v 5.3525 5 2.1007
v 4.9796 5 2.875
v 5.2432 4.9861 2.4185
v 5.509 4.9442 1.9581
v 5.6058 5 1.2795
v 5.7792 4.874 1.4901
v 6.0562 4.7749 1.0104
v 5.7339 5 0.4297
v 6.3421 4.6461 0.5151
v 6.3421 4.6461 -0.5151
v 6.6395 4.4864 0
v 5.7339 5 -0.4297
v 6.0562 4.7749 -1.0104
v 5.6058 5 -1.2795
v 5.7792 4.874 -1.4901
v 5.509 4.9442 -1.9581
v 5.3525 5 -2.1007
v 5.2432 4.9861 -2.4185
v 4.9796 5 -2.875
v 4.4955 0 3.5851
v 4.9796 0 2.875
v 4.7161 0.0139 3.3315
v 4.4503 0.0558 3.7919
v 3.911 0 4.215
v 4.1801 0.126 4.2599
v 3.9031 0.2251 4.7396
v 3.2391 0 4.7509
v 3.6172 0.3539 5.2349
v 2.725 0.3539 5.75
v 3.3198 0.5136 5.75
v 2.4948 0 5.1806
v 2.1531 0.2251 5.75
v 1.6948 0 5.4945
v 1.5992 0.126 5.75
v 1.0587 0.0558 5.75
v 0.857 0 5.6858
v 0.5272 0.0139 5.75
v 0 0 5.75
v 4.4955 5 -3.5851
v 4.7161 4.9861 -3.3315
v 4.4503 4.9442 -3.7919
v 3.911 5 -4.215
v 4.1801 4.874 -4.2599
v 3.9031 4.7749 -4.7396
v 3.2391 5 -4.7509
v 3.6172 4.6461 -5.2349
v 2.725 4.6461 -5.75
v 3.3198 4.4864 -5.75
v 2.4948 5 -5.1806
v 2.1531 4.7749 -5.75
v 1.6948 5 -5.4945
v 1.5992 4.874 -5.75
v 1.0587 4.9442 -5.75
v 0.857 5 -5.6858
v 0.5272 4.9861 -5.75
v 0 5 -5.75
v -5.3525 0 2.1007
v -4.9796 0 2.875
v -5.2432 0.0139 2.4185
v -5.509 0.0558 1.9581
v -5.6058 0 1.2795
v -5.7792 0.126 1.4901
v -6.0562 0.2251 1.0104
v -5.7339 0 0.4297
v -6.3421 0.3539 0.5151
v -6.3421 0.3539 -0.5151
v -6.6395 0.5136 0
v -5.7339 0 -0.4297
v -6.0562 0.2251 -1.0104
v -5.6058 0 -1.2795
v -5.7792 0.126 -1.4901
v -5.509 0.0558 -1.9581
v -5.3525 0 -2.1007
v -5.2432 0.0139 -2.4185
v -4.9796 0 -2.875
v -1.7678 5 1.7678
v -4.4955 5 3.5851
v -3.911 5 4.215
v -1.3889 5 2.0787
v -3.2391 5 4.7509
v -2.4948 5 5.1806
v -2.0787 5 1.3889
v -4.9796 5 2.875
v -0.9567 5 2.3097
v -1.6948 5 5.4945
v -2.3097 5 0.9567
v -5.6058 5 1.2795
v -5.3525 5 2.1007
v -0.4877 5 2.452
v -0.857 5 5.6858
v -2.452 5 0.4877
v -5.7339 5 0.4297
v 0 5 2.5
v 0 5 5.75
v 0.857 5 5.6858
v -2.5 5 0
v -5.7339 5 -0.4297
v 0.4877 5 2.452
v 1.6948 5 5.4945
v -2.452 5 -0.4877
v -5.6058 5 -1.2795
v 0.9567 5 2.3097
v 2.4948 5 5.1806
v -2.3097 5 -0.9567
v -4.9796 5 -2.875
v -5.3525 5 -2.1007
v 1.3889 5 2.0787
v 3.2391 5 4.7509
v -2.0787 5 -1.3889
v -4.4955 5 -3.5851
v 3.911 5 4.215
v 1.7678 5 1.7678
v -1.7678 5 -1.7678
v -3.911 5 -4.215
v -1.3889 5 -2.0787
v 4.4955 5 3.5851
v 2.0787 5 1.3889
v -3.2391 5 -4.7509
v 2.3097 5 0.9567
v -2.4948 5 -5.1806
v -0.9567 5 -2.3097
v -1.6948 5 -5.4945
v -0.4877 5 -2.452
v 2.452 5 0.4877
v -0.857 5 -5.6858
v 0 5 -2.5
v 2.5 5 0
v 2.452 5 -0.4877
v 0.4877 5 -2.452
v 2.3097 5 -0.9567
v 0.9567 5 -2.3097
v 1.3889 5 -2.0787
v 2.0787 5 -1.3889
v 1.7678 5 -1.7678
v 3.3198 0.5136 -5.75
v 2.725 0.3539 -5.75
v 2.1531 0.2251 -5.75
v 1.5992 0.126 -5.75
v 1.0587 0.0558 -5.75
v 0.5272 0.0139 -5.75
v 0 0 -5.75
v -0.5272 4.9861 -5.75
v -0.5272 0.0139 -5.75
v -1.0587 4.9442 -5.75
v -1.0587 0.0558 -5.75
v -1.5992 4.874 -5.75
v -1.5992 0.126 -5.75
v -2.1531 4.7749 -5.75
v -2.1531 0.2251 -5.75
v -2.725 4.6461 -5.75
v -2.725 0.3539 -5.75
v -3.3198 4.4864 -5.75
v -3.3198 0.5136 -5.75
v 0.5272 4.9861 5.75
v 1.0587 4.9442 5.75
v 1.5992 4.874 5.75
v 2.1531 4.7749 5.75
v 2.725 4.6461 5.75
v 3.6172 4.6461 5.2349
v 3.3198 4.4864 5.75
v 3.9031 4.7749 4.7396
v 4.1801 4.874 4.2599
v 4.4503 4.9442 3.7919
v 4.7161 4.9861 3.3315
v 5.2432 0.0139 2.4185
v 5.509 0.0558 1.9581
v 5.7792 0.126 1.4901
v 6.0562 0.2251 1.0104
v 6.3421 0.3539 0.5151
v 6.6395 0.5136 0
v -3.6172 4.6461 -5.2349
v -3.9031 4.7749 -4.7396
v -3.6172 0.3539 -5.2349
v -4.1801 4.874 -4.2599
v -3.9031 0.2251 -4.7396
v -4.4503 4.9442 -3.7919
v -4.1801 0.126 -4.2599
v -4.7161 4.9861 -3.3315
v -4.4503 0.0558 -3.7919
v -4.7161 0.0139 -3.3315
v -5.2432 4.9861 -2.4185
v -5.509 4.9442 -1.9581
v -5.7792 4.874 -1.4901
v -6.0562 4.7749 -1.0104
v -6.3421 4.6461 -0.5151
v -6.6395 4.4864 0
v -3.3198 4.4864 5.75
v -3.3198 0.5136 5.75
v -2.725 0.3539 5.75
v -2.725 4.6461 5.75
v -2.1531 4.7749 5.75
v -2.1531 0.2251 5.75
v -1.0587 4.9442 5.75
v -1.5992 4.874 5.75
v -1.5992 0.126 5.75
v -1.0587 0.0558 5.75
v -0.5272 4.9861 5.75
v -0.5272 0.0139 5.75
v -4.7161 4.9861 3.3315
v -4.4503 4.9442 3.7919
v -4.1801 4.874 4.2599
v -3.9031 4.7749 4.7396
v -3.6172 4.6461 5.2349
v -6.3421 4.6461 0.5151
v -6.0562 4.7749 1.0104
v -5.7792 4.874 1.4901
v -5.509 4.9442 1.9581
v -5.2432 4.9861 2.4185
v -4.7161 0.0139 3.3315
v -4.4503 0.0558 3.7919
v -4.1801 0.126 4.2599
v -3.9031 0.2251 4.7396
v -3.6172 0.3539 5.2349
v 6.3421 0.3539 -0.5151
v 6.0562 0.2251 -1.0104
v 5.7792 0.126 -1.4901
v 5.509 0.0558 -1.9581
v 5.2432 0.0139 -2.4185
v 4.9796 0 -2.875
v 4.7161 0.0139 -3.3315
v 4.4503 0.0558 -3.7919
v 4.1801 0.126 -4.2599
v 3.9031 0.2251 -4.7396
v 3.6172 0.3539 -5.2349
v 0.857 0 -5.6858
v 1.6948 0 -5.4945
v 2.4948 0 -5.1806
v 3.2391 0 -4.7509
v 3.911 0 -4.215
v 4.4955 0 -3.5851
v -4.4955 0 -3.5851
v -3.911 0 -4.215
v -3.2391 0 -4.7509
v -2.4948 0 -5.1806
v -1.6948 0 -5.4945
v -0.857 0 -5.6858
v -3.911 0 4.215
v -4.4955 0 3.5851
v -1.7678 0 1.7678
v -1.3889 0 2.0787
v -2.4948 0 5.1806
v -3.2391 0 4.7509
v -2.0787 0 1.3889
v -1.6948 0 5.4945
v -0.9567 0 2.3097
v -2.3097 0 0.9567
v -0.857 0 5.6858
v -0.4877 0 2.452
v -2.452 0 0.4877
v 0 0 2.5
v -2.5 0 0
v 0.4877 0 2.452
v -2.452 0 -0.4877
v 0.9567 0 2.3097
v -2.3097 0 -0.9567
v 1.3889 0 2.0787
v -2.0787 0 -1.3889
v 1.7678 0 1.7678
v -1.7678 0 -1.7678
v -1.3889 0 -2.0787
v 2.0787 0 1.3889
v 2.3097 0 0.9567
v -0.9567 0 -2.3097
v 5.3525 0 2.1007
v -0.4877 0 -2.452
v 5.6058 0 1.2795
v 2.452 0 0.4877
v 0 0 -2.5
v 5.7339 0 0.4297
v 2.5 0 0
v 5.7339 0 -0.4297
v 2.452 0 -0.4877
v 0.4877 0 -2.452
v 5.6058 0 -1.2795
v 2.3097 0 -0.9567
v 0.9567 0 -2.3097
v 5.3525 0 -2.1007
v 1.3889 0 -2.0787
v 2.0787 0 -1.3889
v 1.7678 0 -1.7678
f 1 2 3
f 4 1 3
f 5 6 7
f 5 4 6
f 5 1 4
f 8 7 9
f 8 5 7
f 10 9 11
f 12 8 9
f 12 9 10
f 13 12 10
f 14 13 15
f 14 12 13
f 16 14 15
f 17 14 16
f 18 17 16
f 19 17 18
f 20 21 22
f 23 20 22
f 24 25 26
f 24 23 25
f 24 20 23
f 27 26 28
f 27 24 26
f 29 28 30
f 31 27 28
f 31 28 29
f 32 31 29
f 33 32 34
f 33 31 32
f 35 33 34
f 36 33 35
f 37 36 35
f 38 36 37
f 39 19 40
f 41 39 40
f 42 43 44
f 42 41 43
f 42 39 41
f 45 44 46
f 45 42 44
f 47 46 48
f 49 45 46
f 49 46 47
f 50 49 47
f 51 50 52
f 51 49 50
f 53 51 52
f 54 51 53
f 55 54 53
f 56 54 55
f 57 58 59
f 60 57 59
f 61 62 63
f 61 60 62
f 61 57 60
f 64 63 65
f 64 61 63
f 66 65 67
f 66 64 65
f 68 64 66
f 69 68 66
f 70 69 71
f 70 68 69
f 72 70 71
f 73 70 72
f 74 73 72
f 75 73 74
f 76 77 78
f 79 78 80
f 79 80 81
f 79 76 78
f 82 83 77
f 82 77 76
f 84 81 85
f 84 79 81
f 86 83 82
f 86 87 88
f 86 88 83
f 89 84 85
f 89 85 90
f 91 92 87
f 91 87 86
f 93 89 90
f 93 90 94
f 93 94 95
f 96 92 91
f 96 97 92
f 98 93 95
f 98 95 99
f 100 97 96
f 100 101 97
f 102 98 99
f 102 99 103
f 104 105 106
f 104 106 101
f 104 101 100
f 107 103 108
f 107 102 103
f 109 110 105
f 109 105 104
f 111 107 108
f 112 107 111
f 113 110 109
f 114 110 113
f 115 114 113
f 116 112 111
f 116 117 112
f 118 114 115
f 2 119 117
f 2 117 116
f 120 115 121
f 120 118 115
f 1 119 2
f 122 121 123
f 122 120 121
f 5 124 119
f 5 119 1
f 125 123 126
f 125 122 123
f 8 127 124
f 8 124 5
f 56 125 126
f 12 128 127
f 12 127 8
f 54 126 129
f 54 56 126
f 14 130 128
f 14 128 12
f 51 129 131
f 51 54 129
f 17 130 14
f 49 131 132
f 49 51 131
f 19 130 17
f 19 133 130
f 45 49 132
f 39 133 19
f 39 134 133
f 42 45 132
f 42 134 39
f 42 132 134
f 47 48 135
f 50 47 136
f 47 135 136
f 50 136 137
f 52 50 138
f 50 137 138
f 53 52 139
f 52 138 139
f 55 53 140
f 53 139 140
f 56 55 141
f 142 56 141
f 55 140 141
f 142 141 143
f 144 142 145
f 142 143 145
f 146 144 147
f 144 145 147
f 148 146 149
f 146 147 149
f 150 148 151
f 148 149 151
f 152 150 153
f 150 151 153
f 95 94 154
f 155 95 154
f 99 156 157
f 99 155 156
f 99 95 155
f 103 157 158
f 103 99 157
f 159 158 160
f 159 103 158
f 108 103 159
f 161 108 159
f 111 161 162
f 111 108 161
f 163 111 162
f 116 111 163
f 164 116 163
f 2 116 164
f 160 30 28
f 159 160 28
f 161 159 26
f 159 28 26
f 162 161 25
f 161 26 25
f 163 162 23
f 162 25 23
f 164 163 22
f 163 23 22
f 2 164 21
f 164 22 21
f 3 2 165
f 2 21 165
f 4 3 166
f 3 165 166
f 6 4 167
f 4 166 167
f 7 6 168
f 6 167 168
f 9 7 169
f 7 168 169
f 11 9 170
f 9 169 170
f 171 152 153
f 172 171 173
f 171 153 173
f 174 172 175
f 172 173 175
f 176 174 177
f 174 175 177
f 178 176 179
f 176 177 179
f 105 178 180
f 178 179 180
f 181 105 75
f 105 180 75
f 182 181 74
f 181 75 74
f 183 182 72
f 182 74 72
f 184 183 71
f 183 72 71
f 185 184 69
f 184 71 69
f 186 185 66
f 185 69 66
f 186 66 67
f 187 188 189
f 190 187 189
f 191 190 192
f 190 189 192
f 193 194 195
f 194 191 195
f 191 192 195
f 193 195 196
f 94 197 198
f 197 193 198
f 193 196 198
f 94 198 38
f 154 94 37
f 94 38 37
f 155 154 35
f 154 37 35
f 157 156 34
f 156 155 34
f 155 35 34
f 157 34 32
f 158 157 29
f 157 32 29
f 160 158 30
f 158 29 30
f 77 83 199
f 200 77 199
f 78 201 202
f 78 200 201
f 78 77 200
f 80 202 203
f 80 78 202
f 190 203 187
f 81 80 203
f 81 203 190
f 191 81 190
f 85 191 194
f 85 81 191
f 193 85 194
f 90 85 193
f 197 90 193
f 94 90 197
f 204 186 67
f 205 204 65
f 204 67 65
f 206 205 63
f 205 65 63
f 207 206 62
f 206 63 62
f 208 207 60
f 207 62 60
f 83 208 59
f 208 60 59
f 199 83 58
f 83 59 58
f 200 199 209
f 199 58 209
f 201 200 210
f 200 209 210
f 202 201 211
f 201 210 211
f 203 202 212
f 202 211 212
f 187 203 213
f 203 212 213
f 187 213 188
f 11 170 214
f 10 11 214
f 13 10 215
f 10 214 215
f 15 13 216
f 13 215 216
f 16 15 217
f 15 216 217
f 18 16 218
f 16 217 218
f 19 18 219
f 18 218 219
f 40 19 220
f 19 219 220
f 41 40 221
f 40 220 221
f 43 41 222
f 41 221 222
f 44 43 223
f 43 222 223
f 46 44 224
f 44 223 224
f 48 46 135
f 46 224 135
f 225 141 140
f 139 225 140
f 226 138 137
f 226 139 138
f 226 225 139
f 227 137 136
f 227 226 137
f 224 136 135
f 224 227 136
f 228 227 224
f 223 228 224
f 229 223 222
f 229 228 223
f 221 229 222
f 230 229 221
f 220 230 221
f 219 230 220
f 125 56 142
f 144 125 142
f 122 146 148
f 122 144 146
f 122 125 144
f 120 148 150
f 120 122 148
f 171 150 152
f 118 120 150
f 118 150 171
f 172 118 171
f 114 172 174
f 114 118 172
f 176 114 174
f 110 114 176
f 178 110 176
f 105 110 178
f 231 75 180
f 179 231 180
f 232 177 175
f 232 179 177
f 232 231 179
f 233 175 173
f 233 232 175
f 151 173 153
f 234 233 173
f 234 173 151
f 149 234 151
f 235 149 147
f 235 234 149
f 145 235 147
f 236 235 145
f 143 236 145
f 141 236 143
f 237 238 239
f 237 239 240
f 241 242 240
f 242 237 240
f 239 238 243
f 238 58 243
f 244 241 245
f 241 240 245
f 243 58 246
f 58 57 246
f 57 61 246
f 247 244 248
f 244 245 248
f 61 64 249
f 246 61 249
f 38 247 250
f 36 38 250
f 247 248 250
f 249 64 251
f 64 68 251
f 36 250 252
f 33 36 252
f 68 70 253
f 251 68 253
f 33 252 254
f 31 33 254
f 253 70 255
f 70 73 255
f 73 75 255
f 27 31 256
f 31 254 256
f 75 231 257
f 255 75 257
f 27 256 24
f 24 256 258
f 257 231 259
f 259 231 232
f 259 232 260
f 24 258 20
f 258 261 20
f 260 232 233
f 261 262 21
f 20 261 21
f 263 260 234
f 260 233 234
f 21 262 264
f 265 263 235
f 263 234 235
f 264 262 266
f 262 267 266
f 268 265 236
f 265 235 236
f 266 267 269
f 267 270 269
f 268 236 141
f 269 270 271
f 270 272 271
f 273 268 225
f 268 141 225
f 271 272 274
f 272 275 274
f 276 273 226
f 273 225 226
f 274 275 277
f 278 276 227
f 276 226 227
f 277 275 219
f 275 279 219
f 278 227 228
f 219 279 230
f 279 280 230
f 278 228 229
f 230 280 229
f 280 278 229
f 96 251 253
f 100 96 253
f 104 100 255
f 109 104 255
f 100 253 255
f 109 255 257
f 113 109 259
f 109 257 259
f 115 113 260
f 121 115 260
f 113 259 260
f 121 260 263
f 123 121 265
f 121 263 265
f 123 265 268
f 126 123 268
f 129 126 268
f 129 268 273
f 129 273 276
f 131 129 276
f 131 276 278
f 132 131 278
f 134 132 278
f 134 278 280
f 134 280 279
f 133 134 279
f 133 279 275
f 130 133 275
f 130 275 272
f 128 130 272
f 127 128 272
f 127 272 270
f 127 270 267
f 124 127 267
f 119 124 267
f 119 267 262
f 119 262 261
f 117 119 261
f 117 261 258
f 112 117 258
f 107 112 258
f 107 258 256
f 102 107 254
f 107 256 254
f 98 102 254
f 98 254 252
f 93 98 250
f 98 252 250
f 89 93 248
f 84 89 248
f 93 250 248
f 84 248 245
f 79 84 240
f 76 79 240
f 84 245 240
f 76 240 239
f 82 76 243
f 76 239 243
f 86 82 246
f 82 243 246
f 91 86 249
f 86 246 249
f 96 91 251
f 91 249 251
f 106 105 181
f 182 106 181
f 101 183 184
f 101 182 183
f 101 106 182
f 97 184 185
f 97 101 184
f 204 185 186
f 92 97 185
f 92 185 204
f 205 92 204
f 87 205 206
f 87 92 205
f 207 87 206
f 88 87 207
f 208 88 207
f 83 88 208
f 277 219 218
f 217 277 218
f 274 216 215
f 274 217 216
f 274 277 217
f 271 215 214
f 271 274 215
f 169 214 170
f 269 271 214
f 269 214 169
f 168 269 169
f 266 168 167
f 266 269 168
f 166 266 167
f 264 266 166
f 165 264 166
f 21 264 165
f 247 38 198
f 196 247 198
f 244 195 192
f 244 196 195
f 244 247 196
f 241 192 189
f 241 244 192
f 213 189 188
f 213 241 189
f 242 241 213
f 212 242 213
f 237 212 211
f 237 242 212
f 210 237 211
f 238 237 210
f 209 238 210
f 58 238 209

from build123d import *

# Parameters (mm, degrees)
BOSS_EXTRUDE1_DEPTH   = 5
SKETCH2_OUTSIDE_W     = 36.254
SKETCH2_OUTSIDE_H     = 34.474
SKETCH2_OUTSIDE_R     = 5.75
CUT_EXTRUDE1_DEPTH    = 5
CUT_EXTRUDE1_DRAFT    = -60
SKETCH3_OUTSIDE_W     = 36.254
SKETCH3_OUTSIDE_H     = 34.474
SKETCH3_OUTSIDE_R     = 5.75
CUT_EXTRUDE2_DEPTH    = 5
CUT_EXTRUDE2_DRAFT    = -60
M6_TAPPED_HOLE1_D     = 5
M6_TAPPED_HOLE1_DEPTH = 17


with BuildPart() as part:
    # Sketch1 → Boss-Extrude1 (new body)
    with BuildSketch(Plane(origin=(0, 0, 0), x_dir=(1, 0, 0), z_dir=(0, 1, 0))):
        Polygon((6.639528096, 0), (3.319764048, 5.75), (-3.319764048, 5.75), (-6.639528096, 0), (-3.319764048, -5.75), (3.319764048, -5.75), align=None)
    extrude(amount=BOSS_EXTRUDE1_DEPTH)


with BuildPart() as cut_extrude1_tool:
    # Sketch2 outside → Cut-Extrude1 (with draft: the straight prism first)
    with BuildSketch(Plane(origin=(0, 5, 0), x_dir=(1, 0, 0), z_dir=(0, 1, 0))):
        Rectangle(SKETCH2_OUTSIDE_W, SKETCH2_OUTSIDE_H)
        Circle(SKETCH2_OUTSIDE_R, mode=Mode.SUBTRACT)
    extrude(amount=-CUT_EXTRUDE1_DEPTH)
    # Cut-Extrude1: the draft: its side faces are tilted about the plane it starts from
    cut_extrude1_sides = [cut_extrude1_tool.faces().sort_by_distance(p)[0] for p in [
        (0, 2.5, 17.237),
        (18.127, 2.5, 0),
        (0, 2.5, -17.237),
        (-18.127, 2.5, 0),
        (-5.75, 2.5, 0),
    ]]
    draft(cut_extrude1_sides, Plane(origin=(0, 5, 0), x_dir=(1, 0, 0), z_dir=(0, 1, 0)), CUT_EXTRUDE1_DRAFT)


with BuildPart() as part_1:
    add(part.part)

    # Cut-Extrude1: cut by cut_extrude1_tool
    add(cut_extrude1_tool.part, mode=Mode.SUBTRACT)


with BuildPart() as cut_extrude2_tool:
    # Sketch3 outside → Cut-Extrude2 (with draft: the straight prism first)
    with BuildSketch(Plane.XZ):
        Rectangle(SKETCH3_OUTSIDE_W, SKETCH3_OUTSIDE_H)
        Circle(SKETCH3_OUTSIDE_R, mode=Mode.SUBTRACT)
    extrude(amount=-CUT_EXTRUDE2_DEPTH)
    # Cut-Extrude2: the draft: its side faces are tilted about the plane it starts from
    cut_extrude2_sides = [cut_extrude2_tool.faces().sort_by_distance(p)[0] for p in [
        (0, 2.5, -17.237),
        (18.127, 2.5, 0),
        (0, 2.5, 17.237),
        (-18.127, 2.5, 0),
        (-5.75, 2.5, 0),
    ]]
    draft(cut_extrude2_sides, Plane.XZ, CUT_EXTRUDE2_DRAFT)


with BuildPart() as part_2:
    add(part_1.part)

    # Cut-Extrude2: cut by cut_extrude2_tool
    add(cut_extrude2_tool.part, mode=Mode.SUBTRACT)

    # M6 Tapped Hole1
    with Locations(Plane(origin=(0, 5, 0), x_dir=(1, 0, 0), z_dir=(0, 1, 0))):
        with Locations((0, 0)):
            Hole(M6_TAPPED_HOLE1_D / 2, depth=M6_TAPPED_HOLE1_DEPTH)


solid = part_2.part
